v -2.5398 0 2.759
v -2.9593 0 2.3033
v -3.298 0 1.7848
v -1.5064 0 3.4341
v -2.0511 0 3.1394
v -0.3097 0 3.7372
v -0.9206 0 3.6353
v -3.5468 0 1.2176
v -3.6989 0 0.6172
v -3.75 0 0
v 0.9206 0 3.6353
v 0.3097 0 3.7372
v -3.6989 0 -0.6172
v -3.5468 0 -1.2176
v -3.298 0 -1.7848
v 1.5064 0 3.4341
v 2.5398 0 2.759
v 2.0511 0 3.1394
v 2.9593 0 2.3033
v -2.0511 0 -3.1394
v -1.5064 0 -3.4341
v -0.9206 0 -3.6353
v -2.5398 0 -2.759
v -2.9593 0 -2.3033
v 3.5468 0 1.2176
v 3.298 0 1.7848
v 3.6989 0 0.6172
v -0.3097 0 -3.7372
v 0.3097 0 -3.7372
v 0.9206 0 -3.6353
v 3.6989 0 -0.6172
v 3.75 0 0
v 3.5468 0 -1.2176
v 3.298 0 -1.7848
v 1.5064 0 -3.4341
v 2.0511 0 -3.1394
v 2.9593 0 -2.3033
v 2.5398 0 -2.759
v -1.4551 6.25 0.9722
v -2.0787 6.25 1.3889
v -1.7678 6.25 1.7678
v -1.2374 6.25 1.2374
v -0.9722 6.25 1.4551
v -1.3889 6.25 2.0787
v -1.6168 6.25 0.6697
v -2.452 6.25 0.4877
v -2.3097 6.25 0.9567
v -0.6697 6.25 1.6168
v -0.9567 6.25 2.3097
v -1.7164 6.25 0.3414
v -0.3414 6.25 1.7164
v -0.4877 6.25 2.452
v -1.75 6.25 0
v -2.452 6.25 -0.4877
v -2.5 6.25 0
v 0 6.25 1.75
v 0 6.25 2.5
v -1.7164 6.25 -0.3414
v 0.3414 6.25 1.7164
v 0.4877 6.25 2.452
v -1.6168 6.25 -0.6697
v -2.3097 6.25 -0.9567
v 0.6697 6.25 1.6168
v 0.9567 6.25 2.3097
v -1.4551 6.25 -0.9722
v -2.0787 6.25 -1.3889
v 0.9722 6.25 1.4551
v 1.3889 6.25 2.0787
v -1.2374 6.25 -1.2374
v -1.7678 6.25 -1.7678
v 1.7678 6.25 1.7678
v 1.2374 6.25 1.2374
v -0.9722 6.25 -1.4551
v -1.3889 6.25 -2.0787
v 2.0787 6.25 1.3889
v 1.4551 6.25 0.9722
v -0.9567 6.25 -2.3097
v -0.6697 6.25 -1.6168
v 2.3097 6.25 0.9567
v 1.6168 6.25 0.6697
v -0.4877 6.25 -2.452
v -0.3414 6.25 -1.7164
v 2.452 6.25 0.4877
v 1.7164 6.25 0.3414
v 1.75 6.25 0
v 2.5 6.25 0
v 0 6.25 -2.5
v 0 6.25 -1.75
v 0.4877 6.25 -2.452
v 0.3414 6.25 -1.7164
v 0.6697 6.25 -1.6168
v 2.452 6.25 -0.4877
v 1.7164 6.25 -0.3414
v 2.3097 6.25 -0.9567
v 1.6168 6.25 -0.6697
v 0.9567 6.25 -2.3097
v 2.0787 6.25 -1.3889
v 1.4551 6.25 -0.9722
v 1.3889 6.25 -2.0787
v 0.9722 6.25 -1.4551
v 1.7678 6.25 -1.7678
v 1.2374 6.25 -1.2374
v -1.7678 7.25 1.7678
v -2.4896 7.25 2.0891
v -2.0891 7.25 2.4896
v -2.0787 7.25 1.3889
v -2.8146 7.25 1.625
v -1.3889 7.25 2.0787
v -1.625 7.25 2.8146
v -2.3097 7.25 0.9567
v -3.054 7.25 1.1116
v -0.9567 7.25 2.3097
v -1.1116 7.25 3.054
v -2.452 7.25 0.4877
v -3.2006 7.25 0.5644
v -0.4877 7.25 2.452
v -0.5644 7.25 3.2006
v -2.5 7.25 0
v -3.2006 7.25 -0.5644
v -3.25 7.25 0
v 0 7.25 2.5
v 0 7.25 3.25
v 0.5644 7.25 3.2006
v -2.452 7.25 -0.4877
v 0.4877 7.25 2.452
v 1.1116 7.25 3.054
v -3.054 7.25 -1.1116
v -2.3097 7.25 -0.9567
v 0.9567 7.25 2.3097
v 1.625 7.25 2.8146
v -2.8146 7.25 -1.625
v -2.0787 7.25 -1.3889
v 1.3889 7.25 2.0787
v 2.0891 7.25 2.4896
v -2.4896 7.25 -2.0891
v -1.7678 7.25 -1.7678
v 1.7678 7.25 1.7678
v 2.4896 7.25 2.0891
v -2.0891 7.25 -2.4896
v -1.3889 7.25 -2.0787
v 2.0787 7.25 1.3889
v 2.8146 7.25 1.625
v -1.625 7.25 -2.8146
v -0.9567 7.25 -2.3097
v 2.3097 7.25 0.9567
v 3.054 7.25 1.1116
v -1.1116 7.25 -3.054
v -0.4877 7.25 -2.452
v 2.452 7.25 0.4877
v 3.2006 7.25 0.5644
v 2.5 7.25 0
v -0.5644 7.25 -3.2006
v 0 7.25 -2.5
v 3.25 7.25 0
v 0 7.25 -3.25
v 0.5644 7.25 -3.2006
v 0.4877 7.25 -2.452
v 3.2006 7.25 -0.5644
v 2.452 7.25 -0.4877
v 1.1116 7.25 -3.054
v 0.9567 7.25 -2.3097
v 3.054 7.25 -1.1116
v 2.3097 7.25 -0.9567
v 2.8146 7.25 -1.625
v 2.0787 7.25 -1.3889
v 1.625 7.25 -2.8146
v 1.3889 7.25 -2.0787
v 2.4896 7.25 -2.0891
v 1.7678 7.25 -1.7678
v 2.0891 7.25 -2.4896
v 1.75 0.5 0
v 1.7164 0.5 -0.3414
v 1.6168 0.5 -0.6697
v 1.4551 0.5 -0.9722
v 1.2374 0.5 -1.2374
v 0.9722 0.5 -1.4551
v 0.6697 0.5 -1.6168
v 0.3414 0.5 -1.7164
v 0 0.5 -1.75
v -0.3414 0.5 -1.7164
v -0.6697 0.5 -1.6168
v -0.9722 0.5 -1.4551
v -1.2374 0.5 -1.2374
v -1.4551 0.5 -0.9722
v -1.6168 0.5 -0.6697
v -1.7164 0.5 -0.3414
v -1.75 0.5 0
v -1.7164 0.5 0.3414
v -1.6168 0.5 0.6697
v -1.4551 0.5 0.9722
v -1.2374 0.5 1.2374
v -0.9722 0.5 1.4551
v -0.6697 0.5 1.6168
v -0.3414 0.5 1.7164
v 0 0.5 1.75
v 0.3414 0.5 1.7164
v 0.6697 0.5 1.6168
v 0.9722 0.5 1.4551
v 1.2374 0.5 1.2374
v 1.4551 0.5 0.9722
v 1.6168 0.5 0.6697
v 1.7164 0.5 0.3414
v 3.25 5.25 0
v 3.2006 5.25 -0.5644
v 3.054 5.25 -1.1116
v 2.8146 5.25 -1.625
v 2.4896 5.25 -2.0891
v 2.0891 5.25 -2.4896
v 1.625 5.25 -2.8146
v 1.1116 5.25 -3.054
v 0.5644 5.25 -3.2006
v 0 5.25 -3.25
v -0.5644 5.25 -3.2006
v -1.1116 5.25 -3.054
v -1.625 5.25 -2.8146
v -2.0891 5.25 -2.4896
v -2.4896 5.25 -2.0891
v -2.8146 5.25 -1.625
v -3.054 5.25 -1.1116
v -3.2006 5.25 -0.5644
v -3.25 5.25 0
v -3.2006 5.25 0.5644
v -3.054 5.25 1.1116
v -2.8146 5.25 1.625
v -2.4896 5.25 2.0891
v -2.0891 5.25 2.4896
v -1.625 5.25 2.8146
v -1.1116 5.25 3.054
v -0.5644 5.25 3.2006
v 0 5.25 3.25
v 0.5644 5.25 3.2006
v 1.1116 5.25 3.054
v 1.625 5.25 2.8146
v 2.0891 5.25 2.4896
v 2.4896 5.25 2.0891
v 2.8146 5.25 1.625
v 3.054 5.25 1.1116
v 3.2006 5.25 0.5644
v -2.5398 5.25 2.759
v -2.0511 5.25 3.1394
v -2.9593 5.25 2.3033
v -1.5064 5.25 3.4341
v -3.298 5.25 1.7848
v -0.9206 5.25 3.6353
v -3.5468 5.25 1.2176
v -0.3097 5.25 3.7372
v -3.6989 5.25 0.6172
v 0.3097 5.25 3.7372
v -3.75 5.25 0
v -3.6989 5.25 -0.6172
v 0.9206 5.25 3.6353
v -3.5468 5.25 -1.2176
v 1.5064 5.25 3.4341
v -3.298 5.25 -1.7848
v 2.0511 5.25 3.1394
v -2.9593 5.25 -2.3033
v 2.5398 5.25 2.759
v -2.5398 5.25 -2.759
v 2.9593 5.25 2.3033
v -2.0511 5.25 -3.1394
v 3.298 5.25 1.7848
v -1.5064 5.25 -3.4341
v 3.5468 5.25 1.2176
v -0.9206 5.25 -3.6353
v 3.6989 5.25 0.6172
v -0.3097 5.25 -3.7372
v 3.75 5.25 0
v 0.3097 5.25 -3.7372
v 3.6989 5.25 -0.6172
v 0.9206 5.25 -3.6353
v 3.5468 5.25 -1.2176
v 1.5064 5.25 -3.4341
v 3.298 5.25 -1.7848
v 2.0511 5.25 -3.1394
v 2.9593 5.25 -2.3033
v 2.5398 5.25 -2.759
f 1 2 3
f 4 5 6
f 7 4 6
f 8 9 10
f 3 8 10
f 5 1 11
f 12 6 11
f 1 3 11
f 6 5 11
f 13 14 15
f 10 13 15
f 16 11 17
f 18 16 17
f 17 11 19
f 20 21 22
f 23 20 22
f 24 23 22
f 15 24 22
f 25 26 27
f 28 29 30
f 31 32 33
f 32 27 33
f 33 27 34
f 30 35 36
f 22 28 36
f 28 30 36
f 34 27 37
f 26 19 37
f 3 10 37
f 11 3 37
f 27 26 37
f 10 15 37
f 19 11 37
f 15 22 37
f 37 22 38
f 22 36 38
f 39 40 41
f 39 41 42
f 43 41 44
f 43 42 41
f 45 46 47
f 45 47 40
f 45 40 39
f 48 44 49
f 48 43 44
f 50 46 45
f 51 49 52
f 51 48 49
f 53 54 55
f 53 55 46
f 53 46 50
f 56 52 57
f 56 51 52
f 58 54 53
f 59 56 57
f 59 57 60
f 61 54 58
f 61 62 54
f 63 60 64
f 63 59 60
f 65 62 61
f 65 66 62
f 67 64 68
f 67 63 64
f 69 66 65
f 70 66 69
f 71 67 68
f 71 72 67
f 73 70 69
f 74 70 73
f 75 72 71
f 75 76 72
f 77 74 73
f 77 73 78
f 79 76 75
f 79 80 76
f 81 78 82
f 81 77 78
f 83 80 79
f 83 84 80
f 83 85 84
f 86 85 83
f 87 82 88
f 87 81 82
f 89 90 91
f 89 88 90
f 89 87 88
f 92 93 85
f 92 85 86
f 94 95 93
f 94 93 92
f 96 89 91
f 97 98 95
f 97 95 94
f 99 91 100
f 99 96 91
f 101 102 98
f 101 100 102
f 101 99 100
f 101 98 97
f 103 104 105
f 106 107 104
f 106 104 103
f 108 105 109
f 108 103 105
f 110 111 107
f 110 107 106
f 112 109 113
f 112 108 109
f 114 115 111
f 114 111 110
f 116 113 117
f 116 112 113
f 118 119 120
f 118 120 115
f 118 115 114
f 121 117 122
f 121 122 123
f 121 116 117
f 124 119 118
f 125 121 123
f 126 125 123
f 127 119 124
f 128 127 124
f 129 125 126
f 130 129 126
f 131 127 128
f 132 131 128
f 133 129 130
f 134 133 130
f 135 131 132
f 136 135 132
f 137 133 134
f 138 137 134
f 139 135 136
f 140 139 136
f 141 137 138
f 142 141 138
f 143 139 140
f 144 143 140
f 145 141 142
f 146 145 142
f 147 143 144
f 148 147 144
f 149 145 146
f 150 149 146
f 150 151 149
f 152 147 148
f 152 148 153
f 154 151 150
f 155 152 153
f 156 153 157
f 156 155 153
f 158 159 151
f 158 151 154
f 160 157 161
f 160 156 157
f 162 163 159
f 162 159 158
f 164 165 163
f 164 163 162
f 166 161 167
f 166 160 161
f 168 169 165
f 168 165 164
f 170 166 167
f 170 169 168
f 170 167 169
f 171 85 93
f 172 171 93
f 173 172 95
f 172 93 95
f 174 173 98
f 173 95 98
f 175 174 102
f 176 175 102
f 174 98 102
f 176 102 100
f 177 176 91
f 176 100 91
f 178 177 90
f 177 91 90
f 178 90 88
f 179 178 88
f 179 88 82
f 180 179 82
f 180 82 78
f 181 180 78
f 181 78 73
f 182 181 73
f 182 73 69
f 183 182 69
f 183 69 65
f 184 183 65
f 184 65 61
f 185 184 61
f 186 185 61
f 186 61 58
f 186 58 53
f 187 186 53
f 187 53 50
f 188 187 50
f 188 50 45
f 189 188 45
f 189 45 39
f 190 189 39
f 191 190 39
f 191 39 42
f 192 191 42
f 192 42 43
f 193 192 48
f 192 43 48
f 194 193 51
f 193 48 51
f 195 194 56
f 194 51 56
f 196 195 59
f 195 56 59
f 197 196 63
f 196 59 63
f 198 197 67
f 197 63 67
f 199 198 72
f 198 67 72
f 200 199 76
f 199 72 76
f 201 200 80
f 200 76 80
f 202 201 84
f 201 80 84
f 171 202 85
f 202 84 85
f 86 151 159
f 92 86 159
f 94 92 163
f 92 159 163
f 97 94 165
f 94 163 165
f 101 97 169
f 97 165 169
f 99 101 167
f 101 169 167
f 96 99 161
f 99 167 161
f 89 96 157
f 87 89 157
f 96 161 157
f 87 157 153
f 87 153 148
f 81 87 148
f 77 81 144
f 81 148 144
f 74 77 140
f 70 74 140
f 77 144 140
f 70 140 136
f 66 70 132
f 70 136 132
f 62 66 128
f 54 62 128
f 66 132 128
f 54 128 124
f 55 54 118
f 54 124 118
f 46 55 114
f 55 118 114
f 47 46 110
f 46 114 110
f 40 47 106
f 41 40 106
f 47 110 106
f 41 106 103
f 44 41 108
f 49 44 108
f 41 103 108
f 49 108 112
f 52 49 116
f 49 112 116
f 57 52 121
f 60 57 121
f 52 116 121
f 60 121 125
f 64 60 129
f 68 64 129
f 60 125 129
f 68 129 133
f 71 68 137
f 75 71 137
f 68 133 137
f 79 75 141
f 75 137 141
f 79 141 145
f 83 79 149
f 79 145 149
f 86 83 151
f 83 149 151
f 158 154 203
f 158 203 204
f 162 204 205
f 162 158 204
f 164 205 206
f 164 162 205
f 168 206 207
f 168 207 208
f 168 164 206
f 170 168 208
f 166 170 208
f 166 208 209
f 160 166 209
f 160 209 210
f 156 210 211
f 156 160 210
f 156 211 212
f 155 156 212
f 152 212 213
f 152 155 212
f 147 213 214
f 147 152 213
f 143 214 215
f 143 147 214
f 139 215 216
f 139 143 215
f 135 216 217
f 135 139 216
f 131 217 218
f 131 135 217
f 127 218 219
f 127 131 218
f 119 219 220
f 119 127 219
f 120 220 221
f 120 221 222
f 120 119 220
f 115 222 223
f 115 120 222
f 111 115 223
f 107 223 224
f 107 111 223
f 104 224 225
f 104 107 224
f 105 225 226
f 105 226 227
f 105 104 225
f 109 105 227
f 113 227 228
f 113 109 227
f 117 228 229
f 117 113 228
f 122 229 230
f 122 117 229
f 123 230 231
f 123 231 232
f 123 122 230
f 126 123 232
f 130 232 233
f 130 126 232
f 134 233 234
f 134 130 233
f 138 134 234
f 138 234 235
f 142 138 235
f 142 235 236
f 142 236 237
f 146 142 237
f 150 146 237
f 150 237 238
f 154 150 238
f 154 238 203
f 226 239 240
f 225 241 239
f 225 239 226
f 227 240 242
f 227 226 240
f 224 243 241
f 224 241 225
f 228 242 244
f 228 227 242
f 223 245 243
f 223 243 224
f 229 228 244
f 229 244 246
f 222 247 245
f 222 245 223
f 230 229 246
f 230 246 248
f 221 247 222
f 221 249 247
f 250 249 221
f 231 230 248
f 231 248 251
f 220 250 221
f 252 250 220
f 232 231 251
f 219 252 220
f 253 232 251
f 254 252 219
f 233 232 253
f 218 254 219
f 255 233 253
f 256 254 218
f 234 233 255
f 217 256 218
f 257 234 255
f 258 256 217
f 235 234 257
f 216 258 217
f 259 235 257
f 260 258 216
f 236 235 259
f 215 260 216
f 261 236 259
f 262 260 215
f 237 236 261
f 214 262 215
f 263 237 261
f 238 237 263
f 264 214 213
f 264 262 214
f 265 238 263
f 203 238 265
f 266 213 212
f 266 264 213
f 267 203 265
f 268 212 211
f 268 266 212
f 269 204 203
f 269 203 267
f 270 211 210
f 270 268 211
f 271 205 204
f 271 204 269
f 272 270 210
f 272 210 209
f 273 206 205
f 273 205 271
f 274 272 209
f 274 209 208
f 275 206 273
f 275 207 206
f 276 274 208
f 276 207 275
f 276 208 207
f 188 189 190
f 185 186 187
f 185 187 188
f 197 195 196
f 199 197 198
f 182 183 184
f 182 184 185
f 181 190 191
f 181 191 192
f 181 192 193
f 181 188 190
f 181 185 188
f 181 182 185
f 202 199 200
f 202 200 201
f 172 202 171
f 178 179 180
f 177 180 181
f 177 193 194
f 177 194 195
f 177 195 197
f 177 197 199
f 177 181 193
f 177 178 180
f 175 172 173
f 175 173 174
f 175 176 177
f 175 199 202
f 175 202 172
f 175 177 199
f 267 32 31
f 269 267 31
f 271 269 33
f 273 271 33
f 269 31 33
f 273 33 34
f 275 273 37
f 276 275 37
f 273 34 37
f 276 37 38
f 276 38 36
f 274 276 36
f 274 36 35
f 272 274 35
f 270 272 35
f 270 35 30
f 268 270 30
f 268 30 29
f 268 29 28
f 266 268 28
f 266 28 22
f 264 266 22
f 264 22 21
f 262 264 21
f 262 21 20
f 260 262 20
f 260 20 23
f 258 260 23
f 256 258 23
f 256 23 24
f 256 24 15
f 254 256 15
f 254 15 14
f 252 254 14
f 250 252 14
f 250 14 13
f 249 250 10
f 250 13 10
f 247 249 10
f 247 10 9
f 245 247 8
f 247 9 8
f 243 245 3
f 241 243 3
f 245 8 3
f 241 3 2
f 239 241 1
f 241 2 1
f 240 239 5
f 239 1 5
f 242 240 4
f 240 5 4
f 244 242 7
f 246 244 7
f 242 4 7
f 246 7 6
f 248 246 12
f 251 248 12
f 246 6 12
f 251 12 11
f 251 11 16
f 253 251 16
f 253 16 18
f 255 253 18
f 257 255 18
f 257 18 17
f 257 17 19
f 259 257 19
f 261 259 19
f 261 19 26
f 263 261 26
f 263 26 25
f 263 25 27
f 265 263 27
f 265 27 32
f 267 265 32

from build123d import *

# Parameters (mm, degrees)
SKETCH1_R           = 3.75
BOSS_EXTRUDE1_DEPTH = 7.25
SKETCH3_R           = 3.75
SKETCH3_R_2         = 3.25
CUT_EXTRUDE1_DEPTH  = 2
SKETCH4_R           = 1.75
CUT_EXTRUDE2_DEPTH  = 6.75
SKETCH5_R           = 2.5
CUT_EXTRUDE3_DEPTH  = 1


with BuildPart() as part:
    # Sketch1 → Boss-Extrude1 (new body)
    with BuildSketch(Plane(origin=(0, 0, 0), x_dir=(1, 0, 0), z_dir=(0, 1, 0))):
        Circle(SKETCH1_R)
    extrude(amount=BOSS_EXTRUDE1_DEPTH)

    # Sketch3 → Cut-Extrude1 (cut)
    with BuildSketch(Plane(origin=(0, 7.25, 0), x_dir=(1, 0, 0), z_dir=(0, 1, 0))):
        Circle(SKETCH3_R)
        Circle(SKETCH3_R_2, mode=Mode.SUBTRACT)
    extrude(amount=-CUT_EXTRUDE1_DEPTH, mode=Mode.SUBTRACT)

    # Sketch4 → Cut-Extrude2 (cut)
    with BuildSketch(Plane(origin=(0, 7.25, 0), x_dir=(1, 0, 0), z_dir=(0, 1, 0))):
        Circle(SKETCH4_R)
    extrude(amount=-CUT_EXTRUDE2_DEPTH, mode=Mode.SUBTRACT)

    # Sketch5 → Cut-Extrude3 (cut)
    with BuildSketch(Plane(origin=(0, 7.25, 0), x_dir=(1, 0, 0), z_dir=(0, 1, 0))):
        Circle(SKETCH5_R)
    extrude(amount=-CUT_EXTRUDE3_DEPTH, mode=Mode.SUBTRACT)


solid = part.part
